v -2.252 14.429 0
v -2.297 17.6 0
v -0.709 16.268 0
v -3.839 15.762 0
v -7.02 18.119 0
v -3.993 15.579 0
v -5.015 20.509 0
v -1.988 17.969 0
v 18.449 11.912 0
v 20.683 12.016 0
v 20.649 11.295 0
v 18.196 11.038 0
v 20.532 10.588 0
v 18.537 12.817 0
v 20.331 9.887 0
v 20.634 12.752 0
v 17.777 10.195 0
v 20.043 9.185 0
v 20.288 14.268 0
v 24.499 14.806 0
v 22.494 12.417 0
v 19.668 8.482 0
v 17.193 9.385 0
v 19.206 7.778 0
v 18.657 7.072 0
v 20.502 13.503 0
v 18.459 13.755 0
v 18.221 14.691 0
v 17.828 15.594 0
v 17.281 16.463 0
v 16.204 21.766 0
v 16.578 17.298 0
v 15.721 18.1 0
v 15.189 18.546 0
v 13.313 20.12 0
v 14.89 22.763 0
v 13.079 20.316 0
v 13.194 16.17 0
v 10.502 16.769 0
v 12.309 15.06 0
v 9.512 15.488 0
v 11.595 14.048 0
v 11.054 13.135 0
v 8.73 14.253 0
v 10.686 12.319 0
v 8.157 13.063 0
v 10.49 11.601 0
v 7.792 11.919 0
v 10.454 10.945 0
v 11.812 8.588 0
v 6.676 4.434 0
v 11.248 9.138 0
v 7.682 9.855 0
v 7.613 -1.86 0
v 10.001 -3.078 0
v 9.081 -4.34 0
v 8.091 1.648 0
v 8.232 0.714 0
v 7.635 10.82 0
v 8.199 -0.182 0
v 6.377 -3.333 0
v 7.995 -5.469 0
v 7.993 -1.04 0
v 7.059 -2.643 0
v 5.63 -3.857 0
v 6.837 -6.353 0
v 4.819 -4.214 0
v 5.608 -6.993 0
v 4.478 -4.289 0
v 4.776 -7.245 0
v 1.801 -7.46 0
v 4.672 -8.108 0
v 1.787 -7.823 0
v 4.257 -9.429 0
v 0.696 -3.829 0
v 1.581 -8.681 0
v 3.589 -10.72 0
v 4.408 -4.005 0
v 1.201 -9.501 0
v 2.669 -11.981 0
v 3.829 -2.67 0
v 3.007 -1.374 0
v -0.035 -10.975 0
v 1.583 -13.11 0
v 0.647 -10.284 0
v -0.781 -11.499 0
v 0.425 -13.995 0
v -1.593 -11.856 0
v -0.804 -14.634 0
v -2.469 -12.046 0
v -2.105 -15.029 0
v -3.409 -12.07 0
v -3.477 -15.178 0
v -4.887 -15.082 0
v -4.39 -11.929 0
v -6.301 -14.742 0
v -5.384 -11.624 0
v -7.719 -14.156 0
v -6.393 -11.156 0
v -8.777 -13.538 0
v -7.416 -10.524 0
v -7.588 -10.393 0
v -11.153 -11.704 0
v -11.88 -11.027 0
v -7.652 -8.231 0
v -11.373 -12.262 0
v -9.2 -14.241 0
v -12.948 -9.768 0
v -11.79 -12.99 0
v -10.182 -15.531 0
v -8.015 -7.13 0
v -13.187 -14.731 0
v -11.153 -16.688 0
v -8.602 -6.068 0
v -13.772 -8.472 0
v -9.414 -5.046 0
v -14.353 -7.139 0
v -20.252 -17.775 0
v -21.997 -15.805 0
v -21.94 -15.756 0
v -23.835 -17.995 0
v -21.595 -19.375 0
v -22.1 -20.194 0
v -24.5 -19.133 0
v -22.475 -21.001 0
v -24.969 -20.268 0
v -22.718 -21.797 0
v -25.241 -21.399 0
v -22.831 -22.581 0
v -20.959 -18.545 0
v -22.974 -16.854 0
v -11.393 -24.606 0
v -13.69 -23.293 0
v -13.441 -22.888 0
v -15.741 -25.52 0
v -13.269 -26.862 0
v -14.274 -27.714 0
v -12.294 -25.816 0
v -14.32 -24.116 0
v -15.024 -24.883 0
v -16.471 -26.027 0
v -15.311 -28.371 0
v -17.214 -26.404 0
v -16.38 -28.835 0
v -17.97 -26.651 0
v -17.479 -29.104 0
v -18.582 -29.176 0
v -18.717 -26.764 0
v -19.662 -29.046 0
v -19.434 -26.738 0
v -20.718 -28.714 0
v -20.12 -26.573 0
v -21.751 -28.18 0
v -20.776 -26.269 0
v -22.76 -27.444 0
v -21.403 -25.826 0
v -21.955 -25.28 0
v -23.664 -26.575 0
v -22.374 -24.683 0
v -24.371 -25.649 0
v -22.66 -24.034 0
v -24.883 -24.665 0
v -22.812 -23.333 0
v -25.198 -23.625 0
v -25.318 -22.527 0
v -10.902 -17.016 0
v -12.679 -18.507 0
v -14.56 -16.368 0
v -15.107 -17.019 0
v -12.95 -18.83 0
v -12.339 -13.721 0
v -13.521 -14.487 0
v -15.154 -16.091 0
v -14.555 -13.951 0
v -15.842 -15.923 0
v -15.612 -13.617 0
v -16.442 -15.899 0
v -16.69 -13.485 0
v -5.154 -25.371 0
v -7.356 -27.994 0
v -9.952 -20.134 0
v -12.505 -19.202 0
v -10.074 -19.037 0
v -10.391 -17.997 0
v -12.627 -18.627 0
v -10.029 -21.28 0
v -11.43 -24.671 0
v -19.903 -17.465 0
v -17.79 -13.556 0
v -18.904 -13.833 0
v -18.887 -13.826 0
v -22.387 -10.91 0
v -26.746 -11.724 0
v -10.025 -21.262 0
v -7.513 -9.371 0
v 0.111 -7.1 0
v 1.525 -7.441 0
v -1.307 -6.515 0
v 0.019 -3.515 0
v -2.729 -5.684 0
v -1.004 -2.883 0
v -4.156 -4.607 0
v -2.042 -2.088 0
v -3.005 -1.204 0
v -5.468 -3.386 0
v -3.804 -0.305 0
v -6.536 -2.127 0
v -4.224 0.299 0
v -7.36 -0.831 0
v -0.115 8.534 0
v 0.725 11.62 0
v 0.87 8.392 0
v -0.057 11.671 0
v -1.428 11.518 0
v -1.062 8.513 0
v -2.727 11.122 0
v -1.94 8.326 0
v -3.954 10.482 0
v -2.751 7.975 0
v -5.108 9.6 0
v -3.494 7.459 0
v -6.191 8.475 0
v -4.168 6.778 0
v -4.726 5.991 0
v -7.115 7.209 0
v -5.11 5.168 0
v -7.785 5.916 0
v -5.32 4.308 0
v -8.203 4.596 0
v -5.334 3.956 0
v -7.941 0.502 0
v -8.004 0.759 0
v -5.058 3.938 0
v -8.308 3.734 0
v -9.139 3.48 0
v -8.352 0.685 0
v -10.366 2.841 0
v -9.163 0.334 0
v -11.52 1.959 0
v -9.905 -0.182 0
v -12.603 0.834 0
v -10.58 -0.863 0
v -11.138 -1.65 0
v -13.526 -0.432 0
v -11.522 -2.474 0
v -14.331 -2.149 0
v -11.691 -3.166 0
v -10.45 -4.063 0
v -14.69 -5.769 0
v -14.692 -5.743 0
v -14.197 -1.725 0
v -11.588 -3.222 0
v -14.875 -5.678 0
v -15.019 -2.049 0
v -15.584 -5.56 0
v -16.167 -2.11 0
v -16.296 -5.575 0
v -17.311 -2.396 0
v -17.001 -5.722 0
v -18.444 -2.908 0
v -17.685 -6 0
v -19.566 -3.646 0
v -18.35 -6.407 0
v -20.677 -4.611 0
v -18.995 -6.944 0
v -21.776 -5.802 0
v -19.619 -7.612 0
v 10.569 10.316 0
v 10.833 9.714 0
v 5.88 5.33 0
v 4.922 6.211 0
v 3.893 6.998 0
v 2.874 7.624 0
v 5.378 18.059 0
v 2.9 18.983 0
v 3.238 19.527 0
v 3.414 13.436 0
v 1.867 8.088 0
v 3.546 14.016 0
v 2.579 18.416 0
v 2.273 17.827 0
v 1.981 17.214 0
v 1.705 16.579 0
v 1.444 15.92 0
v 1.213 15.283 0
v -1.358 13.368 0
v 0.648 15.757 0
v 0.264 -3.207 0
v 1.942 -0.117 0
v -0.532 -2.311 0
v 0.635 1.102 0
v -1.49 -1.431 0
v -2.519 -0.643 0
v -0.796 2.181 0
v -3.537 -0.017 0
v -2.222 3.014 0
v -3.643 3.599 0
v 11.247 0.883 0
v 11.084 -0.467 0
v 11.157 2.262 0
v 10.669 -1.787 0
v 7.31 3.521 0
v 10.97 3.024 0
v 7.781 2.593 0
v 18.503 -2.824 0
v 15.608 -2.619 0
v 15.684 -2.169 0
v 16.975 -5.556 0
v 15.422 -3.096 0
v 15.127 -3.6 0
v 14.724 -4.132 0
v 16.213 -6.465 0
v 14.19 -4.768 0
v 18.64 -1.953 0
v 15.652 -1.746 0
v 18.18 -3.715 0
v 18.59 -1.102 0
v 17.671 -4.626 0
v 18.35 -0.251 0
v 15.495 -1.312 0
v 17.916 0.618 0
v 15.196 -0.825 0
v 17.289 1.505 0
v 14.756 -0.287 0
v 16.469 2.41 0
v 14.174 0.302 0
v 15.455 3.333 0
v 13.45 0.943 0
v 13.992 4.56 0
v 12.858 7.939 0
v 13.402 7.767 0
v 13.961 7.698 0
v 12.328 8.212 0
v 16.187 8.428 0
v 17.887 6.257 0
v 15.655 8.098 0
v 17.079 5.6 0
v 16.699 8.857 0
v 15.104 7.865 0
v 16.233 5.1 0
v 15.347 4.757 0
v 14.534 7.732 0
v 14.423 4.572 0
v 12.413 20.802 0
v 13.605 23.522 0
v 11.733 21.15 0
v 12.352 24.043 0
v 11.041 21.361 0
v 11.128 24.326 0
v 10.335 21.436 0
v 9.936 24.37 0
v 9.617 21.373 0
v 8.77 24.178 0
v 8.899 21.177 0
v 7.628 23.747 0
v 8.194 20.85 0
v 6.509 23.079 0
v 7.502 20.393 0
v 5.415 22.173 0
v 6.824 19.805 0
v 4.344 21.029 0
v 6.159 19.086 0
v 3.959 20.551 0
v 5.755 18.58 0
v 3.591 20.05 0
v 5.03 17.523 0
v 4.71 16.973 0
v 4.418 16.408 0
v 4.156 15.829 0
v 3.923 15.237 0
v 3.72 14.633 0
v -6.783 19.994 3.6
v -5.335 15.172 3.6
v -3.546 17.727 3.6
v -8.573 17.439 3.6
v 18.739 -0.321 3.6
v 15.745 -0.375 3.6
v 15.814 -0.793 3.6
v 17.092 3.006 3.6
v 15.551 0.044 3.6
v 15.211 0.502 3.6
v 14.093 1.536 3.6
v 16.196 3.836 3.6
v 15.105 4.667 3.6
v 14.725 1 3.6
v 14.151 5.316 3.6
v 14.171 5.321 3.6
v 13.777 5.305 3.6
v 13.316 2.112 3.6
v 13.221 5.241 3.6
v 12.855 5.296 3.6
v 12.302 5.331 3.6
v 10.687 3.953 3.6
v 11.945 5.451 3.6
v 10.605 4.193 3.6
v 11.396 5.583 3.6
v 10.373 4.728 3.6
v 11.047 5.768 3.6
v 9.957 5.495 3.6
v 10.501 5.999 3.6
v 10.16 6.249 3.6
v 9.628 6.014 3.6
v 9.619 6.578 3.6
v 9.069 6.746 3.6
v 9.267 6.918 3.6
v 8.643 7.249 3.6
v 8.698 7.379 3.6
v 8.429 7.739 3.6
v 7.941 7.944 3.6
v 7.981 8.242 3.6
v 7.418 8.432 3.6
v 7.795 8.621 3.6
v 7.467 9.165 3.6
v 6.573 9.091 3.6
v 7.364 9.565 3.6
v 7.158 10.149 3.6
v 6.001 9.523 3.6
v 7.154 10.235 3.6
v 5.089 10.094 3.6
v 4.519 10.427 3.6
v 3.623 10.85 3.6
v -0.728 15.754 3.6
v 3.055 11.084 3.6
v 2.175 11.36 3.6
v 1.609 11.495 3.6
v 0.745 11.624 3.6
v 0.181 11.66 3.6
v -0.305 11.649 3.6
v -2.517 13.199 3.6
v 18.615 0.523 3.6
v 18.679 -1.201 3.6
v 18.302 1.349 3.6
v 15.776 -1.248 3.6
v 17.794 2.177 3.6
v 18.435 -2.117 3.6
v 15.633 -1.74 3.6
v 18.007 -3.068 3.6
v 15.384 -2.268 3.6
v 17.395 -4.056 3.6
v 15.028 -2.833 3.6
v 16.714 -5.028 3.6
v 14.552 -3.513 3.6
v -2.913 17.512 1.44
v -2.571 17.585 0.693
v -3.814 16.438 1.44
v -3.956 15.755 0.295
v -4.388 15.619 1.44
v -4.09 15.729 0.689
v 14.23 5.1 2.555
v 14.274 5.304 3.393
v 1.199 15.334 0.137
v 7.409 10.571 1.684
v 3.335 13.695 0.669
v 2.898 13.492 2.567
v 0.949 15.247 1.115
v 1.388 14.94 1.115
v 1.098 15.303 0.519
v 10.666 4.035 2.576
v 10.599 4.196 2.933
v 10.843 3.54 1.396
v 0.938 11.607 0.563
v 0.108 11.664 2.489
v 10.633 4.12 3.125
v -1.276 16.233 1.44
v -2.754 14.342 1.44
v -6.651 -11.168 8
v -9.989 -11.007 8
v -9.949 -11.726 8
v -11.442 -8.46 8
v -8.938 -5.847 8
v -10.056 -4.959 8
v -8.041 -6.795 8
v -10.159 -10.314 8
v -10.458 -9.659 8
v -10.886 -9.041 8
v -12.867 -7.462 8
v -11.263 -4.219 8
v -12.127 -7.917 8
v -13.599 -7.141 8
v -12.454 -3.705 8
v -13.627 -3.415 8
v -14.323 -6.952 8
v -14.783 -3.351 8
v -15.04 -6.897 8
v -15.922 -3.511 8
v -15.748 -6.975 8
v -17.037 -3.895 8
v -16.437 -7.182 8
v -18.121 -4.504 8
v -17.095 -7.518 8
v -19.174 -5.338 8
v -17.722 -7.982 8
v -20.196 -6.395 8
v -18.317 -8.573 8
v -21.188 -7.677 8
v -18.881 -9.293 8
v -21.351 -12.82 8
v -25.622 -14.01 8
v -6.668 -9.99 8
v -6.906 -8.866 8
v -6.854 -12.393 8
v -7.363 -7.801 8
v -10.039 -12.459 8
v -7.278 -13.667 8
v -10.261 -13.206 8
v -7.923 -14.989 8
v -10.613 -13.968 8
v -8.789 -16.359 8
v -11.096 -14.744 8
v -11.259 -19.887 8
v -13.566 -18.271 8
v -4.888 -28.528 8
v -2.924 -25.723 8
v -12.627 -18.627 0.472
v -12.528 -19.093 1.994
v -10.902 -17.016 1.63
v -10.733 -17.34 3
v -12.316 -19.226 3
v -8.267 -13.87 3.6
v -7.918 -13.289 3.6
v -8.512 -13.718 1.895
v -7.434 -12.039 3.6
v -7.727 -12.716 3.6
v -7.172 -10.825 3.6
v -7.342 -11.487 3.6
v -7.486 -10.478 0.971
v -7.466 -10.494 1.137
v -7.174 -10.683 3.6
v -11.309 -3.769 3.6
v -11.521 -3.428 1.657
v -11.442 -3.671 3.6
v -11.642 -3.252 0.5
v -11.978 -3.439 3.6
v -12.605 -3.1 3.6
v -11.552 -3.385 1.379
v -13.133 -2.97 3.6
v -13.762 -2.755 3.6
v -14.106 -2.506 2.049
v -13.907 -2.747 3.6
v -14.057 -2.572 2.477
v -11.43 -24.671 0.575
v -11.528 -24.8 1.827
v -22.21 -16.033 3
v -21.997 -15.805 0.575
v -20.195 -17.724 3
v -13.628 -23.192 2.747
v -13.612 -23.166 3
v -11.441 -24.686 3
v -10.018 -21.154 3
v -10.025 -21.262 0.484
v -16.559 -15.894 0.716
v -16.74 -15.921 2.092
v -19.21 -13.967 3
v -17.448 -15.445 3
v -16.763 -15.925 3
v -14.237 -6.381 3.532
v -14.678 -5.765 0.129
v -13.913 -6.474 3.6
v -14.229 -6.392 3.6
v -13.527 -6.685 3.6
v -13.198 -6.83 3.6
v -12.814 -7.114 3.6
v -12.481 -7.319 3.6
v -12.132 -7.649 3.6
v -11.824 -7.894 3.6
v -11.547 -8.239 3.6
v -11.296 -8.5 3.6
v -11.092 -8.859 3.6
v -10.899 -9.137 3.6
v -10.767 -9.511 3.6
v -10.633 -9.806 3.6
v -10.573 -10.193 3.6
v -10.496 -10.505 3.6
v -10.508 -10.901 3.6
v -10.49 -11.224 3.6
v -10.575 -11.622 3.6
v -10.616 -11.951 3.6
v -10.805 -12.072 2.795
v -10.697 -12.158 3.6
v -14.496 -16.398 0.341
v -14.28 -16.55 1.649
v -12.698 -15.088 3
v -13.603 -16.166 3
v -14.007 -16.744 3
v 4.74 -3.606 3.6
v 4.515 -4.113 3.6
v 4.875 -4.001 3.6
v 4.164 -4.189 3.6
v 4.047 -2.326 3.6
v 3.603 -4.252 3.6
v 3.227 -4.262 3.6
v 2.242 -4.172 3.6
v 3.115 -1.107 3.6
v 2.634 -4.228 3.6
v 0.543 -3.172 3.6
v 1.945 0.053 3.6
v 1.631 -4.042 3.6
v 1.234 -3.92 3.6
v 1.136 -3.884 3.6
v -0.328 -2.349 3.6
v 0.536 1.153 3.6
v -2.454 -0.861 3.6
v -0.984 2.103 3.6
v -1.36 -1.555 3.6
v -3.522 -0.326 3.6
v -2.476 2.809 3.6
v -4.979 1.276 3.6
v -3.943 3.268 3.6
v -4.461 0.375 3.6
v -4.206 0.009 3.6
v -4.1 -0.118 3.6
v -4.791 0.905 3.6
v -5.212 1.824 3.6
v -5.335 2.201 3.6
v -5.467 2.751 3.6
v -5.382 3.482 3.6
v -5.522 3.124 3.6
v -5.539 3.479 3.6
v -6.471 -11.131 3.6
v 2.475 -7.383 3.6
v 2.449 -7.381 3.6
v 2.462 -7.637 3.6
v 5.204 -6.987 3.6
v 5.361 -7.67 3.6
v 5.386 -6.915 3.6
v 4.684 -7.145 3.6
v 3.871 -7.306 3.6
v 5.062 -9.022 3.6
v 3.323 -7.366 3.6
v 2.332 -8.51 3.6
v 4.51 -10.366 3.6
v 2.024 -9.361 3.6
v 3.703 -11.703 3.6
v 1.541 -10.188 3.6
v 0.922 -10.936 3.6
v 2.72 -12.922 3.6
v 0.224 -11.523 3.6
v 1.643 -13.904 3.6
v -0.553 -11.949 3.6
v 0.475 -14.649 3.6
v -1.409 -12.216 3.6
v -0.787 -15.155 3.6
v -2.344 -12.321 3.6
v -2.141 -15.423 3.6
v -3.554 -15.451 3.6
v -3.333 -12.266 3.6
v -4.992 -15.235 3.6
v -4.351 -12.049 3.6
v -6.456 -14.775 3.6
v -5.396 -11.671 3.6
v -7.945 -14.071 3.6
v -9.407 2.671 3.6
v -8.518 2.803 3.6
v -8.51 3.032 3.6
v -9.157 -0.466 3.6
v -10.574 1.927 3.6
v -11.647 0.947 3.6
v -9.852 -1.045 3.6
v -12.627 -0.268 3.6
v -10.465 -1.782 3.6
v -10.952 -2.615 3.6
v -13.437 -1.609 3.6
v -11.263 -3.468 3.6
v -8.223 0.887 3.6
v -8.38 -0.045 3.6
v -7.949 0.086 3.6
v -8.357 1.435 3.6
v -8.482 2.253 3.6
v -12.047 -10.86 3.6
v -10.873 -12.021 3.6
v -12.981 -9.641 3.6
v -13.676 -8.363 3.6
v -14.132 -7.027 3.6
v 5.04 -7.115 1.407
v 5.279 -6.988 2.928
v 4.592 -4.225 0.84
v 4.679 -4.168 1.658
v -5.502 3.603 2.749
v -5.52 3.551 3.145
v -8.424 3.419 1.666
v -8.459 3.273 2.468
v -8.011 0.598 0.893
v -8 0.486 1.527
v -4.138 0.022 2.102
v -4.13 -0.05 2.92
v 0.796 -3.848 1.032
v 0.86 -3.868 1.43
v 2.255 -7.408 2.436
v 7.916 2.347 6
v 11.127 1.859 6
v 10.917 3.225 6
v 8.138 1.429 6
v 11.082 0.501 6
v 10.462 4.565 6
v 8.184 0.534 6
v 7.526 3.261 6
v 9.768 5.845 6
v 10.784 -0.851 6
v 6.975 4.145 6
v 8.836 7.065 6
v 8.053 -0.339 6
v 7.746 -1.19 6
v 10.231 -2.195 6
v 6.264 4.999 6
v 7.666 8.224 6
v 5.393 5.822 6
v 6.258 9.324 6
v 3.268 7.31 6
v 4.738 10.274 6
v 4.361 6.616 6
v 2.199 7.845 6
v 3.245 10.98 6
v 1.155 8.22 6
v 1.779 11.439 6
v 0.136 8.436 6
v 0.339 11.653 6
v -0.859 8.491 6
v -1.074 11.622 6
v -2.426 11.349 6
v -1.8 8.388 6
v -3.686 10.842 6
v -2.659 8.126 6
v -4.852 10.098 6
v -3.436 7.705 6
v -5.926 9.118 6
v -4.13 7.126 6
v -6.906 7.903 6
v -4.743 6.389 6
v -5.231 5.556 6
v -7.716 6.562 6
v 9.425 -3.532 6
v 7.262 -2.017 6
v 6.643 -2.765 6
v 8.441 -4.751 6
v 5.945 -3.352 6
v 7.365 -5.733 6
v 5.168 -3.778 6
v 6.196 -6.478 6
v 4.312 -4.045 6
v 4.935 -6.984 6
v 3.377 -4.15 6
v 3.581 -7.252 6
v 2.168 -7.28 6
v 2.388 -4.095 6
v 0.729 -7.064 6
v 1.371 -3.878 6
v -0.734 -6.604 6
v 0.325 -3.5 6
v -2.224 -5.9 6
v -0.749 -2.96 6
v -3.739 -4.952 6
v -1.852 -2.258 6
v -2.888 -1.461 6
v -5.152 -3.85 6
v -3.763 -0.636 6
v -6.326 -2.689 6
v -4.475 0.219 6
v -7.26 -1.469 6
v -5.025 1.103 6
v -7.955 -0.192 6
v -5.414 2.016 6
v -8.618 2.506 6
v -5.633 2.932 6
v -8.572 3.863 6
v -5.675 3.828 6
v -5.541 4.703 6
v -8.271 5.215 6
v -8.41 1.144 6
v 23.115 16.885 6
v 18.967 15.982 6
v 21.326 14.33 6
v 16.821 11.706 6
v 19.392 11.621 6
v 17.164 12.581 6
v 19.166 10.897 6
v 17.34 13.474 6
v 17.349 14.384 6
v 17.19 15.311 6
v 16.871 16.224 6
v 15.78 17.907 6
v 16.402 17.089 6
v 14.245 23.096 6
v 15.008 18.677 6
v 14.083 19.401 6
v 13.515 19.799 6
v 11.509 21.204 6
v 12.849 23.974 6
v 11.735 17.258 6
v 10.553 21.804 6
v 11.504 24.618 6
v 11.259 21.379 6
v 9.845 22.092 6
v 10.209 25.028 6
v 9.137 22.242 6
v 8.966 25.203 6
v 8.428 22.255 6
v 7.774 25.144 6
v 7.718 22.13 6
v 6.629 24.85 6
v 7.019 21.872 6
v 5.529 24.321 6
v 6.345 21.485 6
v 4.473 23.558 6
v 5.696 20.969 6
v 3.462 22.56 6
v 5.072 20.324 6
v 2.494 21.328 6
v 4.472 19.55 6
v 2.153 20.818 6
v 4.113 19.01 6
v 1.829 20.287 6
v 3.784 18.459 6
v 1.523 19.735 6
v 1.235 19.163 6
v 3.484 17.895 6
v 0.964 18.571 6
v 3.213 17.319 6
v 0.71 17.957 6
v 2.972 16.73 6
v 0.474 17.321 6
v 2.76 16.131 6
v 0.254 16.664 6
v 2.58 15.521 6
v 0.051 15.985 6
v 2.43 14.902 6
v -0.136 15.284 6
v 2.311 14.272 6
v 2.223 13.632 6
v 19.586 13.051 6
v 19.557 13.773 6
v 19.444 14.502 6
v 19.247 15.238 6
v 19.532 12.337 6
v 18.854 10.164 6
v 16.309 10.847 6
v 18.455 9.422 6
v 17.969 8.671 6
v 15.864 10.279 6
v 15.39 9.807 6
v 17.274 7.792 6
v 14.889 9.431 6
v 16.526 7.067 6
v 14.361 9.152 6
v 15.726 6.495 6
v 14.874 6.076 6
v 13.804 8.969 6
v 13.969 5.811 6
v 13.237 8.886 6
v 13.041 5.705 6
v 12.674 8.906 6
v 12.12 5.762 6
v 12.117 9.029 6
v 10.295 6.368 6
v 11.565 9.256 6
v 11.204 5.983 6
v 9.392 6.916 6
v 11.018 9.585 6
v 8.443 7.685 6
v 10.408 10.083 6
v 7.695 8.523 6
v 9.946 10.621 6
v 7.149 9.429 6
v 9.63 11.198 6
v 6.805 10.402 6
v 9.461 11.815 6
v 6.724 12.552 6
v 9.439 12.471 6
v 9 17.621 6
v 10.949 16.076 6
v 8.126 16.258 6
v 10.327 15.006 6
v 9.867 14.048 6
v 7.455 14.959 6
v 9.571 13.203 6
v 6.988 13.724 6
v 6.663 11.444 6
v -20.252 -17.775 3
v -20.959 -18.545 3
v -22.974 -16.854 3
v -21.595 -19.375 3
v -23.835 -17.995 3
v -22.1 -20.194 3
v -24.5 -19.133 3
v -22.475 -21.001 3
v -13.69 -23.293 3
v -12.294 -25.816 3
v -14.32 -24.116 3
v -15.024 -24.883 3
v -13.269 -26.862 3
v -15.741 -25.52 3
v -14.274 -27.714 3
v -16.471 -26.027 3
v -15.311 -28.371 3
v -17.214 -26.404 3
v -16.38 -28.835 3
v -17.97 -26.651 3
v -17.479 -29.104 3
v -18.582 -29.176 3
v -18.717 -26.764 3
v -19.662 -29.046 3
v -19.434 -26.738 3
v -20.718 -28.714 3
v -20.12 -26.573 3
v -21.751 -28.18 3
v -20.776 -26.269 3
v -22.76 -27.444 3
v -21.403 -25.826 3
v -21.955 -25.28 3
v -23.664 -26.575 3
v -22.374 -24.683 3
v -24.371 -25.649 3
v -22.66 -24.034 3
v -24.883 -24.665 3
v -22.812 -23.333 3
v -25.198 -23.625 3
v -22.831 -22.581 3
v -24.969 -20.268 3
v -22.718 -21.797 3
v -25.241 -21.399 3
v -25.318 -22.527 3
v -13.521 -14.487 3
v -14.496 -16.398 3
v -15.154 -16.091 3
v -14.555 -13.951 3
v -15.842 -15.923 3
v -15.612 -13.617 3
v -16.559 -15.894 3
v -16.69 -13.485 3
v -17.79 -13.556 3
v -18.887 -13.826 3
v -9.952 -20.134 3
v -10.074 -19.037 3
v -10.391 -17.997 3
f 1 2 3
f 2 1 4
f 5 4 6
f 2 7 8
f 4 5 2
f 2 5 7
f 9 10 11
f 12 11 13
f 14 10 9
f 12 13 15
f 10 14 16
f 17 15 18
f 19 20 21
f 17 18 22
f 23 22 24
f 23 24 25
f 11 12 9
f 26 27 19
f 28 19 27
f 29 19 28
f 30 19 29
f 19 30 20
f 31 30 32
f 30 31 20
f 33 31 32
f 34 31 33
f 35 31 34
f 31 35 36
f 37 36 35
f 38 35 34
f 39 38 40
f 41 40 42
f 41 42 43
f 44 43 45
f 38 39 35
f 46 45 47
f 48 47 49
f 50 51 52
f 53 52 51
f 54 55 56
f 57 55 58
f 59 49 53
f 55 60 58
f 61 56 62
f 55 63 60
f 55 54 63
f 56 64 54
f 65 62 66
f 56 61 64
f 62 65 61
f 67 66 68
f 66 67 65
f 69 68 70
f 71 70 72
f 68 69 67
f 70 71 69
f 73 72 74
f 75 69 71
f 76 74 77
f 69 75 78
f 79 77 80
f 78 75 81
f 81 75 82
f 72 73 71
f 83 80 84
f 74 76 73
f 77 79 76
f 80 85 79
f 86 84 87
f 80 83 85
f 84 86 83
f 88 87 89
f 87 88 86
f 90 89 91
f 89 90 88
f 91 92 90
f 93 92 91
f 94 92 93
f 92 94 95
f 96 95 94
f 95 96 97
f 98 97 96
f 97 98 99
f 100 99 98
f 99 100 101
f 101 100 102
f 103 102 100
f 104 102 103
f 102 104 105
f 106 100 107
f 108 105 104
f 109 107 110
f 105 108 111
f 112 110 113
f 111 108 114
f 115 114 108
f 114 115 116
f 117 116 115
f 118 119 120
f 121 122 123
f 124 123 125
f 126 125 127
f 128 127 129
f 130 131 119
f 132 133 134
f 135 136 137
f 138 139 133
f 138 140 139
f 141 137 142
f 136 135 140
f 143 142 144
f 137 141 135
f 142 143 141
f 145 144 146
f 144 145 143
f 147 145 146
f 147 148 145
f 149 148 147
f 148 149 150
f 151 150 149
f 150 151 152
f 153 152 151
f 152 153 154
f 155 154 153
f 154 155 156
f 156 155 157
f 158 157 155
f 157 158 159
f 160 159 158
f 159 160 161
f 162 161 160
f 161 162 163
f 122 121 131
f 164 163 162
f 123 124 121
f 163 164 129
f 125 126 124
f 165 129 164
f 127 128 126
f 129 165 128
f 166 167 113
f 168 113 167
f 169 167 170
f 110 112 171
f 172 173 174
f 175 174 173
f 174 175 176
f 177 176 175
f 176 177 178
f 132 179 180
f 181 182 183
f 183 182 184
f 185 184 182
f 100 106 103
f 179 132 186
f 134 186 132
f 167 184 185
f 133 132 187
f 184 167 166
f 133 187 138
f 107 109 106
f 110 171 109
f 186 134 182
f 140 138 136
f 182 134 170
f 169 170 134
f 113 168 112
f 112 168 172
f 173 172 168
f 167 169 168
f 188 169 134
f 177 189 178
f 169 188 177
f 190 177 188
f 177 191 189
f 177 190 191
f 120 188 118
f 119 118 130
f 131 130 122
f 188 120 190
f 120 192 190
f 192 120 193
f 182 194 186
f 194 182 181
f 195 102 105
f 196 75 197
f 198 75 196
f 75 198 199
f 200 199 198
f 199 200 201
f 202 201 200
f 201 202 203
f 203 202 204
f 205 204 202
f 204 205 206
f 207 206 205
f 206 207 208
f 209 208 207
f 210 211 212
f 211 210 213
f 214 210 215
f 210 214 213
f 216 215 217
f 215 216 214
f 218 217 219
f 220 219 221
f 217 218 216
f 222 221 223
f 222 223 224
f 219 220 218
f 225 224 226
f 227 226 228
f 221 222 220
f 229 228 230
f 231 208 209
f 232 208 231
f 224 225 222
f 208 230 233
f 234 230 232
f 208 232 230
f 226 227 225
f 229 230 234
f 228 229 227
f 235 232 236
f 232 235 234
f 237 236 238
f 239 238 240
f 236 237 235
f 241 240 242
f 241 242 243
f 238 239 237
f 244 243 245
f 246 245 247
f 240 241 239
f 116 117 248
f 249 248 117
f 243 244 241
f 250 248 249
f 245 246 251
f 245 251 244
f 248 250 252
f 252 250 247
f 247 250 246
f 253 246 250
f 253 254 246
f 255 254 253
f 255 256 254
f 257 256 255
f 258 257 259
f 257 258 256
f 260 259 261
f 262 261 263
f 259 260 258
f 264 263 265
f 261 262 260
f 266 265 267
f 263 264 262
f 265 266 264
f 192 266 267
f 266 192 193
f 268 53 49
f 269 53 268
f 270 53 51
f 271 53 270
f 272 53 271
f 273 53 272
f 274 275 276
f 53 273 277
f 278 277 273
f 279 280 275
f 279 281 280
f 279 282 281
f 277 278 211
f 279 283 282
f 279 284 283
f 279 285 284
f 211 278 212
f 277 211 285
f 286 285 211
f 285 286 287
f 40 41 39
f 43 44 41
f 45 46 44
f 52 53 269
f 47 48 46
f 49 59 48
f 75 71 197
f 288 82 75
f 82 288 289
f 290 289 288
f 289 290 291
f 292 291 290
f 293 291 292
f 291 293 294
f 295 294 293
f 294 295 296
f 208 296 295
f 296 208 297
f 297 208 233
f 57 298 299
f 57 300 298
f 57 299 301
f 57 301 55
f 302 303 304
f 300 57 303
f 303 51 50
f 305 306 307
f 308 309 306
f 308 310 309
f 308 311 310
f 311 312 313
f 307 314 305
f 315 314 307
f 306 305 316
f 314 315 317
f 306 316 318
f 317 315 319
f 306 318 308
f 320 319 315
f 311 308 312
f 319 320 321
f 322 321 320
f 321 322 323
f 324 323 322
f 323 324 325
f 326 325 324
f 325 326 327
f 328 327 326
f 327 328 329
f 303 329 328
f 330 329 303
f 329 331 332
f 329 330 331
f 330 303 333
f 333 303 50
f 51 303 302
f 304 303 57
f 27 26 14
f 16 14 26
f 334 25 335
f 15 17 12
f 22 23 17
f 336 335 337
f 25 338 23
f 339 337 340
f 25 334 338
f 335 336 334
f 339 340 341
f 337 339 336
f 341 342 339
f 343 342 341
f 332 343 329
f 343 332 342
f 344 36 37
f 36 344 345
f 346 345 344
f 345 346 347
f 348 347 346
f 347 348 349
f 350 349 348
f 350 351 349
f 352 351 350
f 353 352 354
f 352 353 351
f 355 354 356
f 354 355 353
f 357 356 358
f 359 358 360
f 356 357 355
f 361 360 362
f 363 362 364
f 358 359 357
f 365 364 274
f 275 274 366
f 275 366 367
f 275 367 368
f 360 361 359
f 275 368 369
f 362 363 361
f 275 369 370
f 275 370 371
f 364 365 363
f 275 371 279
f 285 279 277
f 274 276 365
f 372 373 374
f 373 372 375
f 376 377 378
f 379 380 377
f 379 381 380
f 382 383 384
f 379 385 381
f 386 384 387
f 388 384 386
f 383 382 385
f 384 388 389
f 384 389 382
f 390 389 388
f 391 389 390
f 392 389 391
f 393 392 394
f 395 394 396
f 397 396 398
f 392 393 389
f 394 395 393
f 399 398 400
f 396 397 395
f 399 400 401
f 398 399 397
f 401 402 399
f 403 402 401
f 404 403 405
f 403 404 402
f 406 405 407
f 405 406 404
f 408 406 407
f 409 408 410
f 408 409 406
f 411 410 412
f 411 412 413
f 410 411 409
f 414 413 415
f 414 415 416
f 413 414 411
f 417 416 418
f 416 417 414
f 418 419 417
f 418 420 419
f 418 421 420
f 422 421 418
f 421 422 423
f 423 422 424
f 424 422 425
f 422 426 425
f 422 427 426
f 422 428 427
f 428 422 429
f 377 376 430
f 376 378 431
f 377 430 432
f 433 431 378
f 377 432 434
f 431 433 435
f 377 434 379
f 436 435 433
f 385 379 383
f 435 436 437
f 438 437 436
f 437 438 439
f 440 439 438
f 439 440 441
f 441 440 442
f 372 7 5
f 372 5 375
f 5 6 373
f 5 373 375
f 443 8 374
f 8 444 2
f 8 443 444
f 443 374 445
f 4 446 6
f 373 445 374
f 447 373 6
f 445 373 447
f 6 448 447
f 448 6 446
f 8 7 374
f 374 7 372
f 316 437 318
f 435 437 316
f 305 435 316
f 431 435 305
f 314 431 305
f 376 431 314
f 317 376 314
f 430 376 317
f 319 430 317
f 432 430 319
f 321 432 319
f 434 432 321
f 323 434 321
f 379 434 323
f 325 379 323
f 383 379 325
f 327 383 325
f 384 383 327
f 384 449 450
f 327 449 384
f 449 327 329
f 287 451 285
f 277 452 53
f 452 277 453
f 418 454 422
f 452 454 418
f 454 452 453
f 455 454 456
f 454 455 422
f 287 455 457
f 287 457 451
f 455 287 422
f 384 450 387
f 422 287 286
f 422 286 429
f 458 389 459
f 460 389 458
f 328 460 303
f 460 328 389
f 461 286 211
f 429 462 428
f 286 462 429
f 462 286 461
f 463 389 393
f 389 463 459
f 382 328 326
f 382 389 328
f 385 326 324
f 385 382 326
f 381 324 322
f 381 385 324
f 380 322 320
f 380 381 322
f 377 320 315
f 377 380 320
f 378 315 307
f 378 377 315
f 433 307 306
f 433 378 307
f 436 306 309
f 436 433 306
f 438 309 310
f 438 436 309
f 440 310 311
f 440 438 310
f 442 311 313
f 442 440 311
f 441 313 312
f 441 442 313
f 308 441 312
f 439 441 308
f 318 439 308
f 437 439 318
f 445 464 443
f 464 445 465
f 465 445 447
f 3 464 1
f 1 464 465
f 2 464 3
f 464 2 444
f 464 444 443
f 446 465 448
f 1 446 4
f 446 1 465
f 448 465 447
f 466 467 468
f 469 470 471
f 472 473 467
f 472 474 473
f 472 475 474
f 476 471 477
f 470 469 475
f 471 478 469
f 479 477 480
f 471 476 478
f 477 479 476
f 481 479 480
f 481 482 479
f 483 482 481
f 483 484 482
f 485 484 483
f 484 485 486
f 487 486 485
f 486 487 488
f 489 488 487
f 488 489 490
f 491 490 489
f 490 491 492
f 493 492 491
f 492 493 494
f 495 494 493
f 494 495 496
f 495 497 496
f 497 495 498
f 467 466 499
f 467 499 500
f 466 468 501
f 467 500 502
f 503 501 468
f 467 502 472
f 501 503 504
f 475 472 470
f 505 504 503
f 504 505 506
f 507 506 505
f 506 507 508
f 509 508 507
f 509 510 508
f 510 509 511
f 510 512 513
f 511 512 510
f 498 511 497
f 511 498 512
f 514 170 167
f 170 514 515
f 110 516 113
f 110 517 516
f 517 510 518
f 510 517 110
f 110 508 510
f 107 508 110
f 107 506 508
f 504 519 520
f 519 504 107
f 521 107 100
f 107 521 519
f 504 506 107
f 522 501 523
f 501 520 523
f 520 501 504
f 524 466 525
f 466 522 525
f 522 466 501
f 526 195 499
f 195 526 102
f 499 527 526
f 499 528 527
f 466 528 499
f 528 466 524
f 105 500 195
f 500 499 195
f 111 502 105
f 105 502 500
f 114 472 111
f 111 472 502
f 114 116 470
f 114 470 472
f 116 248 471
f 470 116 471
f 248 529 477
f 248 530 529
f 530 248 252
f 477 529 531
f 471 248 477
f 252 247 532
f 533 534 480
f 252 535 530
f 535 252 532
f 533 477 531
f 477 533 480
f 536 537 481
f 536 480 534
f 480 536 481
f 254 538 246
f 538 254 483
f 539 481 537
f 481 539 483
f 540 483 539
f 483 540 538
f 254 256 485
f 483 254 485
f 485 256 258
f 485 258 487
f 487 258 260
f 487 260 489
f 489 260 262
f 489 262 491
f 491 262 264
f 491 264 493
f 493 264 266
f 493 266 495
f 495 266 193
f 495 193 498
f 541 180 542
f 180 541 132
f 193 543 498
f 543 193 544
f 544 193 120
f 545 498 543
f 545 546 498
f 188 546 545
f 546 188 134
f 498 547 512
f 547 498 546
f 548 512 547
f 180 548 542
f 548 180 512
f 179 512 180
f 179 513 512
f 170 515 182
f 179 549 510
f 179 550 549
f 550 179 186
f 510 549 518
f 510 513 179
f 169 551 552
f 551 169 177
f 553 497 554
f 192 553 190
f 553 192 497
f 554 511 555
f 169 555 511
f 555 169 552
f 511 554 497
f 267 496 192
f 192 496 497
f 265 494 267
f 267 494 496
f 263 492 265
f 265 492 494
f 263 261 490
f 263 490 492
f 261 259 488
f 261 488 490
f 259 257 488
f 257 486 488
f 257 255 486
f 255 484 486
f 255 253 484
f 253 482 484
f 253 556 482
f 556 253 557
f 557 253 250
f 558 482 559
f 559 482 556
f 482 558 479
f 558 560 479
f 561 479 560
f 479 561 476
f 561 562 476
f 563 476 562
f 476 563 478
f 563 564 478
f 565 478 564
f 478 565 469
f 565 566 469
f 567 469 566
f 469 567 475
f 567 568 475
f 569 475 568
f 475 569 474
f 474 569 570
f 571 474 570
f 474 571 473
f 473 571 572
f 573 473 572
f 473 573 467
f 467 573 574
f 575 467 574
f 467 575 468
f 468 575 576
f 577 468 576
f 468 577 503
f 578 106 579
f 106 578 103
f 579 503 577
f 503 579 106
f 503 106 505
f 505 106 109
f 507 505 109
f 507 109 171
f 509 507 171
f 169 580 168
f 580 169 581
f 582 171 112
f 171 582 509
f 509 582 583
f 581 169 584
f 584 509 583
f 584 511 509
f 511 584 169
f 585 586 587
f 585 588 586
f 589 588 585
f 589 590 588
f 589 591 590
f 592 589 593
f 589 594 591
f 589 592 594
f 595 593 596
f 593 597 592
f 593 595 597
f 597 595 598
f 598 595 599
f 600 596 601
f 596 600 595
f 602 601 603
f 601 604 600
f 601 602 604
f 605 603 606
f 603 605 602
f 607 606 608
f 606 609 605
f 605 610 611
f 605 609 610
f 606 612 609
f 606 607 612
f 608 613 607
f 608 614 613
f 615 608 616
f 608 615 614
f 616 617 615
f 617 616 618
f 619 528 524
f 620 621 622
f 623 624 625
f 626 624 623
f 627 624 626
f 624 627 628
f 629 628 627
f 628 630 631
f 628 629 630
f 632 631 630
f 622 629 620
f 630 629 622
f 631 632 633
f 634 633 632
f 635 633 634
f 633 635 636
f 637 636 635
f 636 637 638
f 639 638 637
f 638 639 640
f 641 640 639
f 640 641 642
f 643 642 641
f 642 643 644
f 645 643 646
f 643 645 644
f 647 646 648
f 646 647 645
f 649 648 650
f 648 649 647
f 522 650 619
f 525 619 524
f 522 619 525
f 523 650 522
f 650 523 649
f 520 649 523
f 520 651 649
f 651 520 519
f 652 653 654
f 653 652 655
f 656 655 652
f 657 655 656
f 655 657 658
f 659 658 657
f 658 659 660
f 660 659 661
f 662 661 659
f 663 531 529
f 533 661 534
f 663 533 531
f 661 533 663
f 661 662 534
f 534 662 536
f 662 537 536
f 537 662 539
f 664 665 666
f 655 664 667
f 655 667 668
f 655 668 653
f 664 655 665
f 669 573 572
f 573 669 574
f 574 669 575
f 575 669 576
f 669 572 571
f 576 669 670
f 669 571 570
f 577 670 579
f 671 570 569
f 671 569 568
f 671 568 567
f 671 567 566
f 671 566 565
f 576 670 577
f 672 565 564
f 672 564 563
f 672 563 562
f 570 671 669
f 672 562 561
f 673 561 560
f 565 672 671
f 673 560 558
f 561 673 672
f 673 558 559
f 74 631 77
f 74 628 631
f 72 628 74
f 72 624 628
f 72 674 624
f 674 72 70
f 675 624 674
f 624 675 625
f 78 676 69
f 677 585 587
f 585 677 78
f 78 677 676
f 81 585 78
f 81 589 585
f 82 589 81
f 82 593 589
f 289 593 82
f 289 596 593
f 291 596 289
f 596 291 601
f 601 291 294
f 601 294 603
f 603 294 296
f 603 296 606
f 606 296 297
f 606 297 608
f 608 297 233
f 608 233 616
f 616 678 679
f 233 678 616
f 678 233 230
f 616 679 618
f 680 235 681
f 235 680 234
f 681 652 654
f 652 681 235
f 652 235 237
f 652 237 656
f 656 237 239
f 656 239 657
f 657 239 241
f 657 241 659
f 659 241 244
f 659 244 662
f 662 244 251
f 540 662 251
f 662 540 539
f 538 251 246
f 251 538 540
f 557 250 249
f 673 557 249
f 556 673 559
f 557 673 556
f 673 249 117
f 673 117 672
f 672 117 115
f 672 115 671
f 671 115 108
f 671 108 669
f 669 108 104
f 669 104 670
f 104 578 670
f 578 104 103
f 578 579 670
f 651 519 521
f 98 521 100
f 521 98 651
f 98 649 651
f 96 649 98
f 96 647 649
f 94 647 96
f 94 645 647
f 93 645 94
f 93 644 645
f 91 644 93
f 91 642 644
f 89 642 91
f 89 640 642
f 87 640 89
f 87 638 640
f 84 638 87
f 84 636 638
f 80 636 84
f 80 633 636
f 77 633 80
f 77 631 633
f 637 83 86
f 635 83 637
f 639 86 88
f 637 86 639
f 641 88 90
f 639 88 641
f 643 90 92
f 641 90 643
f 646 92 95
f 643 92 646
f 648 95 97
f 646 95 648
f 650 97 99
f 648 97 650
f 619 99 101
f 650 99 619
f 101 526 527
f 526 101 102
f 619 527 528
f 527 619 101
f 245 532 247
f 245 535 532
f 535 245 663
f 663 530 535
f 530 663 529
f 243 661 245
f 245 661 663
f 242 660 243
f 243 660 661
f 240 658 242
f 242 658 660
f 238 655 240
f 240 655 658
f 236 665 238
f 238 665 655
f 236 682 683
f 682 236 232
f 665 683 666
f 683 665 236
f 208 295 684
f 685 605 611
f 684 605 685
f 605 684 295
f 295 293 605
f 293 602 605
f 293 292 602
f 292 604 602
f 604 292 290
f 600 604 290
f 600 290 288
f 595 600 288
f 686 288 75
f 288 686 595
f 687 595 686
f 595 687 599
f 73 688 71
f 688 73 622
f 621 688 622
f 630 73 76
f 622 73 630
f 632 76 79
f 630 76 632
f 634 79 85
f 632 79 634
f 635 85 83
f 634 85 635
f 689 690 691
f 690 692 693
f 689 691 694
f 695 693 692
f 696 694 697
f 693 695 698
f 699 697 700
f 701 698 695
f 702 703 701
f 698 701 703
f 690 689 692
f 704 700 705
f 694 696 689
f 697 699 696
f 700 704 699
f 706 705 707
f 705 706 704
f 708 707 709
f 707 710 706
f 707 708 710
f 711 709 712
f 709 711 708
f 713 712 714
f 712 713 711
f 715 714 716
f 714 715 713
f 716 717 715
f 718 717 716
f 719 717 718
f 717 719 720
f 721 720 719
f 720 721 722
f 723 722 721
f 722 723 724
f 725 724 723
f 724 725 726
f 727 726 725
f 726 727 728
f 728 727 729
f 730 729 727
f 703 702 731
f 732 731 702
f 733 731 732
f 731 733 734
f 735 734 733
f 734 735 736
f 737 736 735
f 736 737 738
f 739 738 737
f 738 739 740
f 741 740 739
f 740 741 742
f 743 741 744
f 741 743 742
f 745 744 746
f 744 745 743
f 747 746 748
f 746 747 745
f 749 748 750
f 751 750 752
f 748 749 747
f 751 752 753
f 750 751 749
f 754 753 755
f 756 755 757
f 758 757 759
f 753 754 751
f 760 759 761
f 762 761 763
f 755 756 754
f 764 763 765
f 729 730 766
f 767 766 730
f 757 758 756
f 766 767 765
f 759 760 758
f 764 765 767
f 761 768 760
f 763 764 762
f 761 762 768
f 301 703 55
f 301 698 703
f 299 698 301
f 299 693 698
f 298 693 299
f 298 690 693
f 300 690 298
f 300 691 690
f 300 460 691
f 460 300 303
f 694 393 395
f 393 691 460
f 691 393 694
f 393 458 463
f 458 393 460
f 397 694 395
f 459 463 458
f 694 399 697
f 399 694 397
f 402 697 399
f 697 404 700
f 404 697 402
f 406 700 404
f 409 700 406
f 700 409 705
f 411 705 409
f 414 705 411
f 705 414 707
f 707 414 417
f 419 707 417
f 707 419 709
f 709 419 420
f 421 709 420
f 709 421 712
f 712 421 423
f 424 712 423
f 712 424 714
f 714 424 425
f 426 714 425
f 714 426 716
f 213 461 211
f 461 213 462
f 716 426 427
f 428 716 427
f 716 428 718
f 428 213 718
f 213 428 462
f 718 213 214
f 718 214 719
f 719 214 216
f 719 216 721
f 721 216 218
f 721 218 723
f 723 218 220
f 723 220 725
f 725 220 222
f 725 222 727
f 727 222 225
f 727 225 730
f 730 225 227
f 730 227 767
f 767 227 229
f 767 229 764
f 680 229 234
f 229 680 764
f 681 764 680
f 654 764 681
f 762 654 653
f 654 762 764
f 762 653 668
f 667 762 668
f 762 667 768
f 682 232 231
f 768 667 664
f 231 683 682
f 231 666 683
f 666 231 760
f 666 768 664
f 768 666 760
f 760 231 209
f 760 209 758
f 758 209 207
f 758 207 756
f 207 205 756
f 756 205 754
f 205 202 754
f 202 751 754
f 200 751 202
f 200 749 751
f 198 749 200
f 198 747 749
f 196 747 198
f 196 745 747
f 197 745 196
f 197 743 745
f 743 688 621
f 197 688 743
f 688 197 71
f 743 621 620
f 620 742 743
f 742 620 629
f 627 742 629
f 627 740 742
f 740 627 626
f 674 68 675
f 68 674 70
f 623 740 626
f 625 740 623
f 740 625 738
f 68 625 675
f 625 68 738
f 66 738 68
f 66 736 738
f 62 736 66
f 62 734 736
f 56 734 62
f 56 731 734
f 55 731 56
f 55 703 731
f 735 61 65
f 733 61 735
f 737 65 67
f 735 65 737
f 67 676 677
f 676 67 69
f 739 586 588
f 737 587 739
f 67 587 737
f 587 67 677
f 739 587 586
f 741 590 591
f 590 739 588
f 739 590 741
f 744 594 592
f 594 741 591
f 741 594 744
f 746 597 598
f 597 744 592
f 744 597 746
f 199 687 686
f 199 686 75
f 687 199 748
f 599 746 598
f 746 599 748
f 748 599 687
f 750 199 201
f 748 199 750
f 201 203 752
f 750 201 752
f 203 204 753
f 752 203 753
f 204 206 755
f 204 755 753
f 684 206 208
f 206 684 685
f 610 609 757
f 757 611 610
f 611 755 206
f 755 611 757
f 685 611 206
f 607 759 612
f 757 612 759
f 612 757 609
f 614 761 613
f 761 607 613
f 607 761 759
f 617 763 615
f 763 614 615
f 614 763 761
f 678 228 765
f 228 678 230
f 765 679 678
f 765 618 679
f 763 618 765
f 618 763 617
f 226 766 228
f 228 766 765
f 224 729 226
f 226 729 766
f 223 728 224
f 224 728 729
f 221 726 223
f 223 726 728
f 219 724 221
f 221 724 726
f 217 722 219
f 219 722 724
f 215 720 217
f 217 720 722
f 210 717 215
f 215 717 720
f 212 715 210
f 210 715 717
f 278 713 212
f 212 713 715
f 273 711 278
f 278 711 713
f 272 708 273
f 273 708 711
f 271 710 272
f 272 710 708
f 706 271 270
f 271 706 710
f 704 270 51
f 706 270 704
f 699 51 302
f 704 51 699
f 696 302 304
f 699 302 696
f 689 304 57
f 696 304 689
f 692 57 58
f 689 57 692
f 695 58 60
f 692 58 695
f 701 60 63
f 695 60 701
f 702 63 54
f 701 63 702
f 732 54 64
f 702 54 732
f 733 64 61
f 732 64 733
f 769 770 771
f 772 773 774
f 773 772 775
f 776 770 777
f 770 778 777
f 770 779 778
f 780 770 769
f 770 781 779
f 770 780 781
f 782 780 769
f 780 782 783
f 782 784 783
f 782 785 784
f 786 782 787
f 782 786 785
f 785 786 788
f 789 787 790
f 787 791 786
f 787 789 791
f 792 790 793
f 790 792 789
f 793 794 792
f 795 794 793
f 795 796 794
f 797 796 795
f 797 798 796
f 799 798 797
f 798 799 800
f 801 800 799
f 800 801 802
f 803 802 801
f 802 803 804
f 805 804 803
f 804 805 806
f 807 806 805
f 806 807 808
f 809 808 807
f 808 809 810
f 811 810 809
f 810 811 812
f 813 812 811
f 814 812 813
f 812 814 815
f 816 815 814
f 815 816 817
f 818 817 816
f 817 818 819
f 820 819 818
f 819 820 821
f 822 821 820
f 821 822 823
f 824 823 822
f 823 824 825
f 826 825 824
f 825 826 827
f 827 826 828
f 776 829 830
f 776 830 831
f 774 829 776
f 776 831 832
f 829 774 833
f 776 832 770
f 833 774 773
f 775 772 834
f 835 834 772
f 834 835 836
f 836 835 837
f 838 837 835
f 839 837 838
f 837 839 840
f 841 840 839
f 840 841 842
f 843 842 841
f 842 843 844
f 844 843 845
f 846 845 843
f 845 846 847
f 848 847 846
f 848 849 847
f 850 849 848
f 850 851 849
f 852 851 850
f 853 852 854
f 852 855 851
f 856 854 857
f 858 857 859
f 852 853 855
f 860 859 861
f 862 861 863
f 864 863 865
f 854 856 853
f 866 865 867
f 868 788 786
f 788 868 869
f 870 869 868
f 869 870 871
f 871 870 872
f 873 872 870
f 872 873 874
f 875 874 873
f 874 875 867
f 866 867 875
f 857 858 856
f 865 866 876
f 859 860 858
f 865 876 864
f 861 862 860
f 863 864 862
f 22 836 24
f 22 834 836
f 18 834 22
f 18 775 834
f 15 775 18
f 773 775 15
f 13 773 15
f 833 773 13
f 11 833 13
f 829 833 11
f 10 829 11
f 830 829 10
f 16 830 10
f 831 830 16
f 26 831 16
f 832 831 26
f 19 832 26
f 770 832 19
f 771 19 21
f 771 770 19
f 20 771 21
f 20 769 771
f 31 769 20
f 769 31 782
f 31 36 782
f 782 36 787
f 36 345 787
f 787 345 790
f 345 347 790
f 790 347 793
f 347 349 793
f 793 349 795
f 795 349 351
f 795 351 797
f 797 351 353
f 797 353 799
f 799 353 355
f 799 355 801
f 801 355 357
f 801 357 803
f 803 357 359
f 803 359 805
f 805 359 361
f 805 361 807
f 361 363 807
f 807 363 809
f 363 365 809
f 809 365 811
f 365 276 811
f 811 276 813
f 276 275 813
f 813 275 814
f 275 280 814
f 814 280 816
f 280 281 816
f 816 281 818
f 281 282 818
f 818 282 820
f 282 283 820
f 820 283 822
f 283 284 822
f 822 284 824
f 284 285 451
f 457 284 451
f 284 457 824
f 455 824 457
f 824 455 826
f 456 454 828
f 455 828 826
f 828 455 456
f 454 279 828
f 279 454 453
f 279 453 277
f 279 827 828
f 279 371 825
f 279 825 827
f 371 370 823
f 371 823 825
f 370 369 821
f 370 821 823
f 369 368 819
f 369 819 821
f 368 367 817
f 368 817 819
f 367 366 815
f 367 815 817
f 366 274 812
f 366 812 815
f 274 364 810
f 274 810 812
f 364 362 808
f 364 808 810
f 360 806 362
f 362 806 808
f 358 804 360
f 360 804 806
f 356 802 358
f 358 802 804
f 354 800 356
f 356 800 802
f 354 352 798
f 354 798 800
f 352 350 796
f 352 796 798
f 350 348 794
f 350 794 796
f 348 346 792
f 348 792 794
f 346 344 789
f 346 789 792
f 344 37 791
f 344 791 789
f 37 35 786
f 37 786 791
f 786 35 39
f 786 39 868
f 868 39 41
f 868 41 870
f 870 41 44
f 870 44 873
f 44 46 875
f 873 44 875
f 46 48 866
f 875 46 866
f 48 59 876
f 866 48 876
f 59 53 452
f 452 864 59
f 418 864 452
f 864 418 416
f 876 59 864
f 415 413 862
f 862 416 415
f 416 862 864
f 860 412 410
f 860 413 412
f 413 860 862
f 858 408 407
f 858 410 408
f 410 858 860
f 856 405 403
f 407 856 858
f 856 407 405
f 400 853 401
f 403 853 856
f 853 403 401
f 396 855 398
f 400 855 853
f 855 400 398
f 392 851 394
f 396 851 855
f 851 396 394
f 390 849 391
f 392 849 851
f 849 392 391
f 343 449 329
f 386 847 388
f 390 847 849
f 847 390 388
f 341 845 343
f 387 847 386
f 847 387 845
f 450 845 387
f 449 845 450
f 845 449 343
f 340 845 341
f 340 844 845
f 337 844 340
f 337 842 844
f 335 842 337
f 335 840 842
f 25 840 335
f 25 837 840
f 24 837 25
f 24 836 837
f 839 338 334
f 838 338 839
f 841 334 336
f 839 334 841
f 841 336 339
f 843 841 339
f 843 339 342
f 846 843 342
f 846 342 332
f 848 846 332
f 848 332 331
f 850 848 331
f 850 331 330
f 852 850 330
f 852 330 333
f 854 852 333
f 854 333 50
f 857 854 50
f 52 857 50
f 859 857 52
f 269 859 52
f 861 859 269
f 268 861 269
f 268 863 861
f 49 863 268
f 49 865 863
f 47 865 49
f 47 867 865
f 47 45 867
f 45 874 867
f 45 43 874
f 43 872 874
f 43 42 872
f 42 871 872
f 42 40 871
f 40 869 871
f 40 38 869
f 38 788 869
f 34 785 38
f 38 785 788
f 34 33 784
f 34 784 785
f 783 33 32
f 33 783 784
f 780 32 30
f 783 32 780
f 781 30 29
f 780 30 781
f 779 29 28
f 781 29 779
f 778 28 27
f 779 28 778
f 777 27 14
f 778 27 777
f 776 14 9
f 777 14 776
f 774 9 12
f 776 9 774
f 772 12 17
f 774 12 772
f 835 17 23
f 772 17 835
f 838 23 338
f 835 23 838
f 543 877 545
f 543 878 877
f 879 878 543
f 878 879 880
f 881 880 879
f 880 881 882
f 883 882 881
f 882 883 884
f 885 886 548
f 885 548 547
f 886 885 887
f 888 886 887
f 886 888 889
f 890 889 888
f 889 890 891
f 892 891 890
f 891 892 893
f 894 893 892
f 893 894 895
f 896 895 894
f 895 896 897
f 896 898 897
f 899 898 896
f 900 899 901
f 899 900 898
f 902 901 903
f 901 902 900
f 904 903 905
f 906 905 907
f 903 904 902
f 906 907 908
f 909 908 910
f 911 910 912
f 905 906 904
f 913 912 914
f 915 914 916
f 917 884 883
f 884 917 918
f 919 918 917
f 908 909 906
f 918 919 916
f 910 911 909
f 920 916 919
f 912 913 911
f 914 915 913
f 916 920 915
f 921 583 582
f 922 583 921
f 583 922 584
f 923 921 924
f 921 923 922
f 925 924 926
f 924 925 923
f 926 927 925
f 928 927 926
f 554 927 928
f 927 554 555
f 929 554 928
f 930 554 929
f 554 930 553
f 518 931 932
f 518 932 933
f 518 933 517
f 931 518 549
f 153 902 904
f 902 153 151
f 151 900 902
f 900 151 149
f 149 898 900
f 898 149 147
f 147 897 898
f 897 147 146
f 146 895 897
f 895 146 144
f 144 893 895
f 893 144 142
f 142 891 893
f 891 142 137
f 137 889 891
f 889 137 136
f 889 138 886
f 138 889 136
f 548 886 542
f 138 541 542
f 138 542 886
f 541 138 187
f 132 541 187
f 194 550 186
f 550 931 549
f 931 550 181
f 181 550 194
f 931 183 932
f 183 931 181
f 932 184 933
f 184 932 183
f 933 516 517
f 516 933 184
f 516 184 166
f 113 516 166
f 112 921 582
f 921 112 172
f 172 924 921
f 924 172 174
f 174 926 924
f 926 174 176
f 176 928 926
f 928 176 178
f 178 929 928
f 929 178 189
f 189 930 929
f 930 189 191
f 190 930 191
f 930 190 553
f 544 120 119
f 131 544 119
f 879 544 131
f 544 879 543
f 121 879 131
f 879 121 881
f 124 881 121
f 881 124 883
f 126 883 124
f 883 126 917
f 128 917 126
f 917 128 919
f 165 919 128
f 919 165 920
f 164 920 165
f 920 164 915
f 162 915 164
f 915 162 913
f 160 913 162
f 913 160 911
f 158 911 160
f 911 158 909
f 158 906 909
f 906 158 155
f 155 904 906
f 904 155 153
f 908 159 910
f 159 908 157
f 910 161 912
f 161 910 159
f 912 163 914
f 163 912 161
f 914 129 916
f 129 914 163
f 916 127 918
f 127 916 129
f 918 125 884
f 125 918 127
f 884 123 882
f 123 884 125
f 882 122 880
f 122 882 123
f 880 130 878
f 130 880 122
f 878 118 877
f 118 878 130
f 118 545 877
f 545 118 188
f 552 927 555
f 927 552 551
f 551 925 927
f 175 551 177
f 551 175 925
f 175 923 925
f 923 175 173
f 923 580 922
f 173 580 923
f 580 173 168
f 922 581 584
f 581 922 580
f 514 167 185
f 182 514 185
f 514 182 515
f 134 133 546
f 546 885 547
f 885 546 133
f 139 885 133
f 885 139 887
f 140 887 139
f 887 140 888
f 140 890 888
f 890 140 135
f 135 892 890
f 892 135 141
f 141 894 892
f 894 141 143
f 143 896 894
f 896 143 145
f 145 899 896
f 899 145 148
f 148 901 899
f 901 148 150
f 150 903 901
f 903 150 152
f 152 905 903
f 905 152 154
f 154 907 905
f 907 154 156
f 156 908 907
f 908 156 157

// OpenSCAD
Font_name = "Chewy";
Text = "Pooja";
Rotation = 50;
Connect_dots = true;
Dot_bridge_height_percent = 40;

function char_w(c) = 
    (c == "m" || c == "w") ? 15.0 :
    (c == "i" || c == "l" || c == "j" || c == "t" || c == "f") ? 7.5 :
    (c >= "A" && c <= "Z") ? 14.0 :
    10.5;

function get_step_at(text, i) = 
    (i <= 0) ? 0 :
    ((char_w(text[i-1]) + char_w(text[i])) / 2 * 0.95);

function get_char_x_auto(text, i) = 
    (i <= 0) ? 0 : (get_char_x_auto(text, i - 1) + get_step_at(text, i));

span = get_char_x_auto(Text, len(Text)-1);
cx = span / 2;
loop_x = -cx - 8.5;
loop_y = 0;
twist = -5;
$fn = 32;

rotate([0, 0, Rotation]) {
    union() {
        // Loop
        color("DimGray")
        linear_extrude(height = 3, $fn = $fn)
            translate([loop_x, loop_y, 0]) rotate([0, 0, -90])
                text(size = 20, text = "o", font = Font_name, halign = "center", valign = "center", $fn = $fn);

        // Letters
        for (i = [0 : len(Text) - 1]) {
            h = (i == 0) ? 8.0 : ((i % 2 == 0) ? 6.0 : 3.6);
            char = Text[i];
            char_x = get_char_x_auto(Text, i) - cx;

            color([0.92, 0.72, 0.1]) {
                // Main letter extrusion (full height h)
                linear_extrude(height = h, twist = twist, $fn = $fn)
                    translate([char_x, 0, 0])
                        text(size = 25, text = char, font = Font_name, halign = "center", valign = "center", $fn = $fn);

                // Recessed bridge at 40% height (retains strength, preserves top surface aesthetics)
                if (Connect_dots) {
                    bridge_factor = Dot_bridge_height_percent / 100;
                    bridge_h = h * bridge_factor;
                    bridge_twist = twist * bridge_factor;
                    if (char == "i") {
                        linear_extrude(height = bridge_h, twist = bridge_twist, $fn = $fn)
                            translate([char_x, 0, 0])
                                translate([-1.2, 6.5]) square([2.4, 4.0]);
                    }
                    if (char == "j") {
                        linear_extrude(height = bridge_h, twist = bridge_twist, $fn = $fn)
                            translate([char_x, 0, 0])
                                translate([-1.2, 11.0]) square([2.4, 4.0]);
                    }
                }
            }
        }
    }
}
